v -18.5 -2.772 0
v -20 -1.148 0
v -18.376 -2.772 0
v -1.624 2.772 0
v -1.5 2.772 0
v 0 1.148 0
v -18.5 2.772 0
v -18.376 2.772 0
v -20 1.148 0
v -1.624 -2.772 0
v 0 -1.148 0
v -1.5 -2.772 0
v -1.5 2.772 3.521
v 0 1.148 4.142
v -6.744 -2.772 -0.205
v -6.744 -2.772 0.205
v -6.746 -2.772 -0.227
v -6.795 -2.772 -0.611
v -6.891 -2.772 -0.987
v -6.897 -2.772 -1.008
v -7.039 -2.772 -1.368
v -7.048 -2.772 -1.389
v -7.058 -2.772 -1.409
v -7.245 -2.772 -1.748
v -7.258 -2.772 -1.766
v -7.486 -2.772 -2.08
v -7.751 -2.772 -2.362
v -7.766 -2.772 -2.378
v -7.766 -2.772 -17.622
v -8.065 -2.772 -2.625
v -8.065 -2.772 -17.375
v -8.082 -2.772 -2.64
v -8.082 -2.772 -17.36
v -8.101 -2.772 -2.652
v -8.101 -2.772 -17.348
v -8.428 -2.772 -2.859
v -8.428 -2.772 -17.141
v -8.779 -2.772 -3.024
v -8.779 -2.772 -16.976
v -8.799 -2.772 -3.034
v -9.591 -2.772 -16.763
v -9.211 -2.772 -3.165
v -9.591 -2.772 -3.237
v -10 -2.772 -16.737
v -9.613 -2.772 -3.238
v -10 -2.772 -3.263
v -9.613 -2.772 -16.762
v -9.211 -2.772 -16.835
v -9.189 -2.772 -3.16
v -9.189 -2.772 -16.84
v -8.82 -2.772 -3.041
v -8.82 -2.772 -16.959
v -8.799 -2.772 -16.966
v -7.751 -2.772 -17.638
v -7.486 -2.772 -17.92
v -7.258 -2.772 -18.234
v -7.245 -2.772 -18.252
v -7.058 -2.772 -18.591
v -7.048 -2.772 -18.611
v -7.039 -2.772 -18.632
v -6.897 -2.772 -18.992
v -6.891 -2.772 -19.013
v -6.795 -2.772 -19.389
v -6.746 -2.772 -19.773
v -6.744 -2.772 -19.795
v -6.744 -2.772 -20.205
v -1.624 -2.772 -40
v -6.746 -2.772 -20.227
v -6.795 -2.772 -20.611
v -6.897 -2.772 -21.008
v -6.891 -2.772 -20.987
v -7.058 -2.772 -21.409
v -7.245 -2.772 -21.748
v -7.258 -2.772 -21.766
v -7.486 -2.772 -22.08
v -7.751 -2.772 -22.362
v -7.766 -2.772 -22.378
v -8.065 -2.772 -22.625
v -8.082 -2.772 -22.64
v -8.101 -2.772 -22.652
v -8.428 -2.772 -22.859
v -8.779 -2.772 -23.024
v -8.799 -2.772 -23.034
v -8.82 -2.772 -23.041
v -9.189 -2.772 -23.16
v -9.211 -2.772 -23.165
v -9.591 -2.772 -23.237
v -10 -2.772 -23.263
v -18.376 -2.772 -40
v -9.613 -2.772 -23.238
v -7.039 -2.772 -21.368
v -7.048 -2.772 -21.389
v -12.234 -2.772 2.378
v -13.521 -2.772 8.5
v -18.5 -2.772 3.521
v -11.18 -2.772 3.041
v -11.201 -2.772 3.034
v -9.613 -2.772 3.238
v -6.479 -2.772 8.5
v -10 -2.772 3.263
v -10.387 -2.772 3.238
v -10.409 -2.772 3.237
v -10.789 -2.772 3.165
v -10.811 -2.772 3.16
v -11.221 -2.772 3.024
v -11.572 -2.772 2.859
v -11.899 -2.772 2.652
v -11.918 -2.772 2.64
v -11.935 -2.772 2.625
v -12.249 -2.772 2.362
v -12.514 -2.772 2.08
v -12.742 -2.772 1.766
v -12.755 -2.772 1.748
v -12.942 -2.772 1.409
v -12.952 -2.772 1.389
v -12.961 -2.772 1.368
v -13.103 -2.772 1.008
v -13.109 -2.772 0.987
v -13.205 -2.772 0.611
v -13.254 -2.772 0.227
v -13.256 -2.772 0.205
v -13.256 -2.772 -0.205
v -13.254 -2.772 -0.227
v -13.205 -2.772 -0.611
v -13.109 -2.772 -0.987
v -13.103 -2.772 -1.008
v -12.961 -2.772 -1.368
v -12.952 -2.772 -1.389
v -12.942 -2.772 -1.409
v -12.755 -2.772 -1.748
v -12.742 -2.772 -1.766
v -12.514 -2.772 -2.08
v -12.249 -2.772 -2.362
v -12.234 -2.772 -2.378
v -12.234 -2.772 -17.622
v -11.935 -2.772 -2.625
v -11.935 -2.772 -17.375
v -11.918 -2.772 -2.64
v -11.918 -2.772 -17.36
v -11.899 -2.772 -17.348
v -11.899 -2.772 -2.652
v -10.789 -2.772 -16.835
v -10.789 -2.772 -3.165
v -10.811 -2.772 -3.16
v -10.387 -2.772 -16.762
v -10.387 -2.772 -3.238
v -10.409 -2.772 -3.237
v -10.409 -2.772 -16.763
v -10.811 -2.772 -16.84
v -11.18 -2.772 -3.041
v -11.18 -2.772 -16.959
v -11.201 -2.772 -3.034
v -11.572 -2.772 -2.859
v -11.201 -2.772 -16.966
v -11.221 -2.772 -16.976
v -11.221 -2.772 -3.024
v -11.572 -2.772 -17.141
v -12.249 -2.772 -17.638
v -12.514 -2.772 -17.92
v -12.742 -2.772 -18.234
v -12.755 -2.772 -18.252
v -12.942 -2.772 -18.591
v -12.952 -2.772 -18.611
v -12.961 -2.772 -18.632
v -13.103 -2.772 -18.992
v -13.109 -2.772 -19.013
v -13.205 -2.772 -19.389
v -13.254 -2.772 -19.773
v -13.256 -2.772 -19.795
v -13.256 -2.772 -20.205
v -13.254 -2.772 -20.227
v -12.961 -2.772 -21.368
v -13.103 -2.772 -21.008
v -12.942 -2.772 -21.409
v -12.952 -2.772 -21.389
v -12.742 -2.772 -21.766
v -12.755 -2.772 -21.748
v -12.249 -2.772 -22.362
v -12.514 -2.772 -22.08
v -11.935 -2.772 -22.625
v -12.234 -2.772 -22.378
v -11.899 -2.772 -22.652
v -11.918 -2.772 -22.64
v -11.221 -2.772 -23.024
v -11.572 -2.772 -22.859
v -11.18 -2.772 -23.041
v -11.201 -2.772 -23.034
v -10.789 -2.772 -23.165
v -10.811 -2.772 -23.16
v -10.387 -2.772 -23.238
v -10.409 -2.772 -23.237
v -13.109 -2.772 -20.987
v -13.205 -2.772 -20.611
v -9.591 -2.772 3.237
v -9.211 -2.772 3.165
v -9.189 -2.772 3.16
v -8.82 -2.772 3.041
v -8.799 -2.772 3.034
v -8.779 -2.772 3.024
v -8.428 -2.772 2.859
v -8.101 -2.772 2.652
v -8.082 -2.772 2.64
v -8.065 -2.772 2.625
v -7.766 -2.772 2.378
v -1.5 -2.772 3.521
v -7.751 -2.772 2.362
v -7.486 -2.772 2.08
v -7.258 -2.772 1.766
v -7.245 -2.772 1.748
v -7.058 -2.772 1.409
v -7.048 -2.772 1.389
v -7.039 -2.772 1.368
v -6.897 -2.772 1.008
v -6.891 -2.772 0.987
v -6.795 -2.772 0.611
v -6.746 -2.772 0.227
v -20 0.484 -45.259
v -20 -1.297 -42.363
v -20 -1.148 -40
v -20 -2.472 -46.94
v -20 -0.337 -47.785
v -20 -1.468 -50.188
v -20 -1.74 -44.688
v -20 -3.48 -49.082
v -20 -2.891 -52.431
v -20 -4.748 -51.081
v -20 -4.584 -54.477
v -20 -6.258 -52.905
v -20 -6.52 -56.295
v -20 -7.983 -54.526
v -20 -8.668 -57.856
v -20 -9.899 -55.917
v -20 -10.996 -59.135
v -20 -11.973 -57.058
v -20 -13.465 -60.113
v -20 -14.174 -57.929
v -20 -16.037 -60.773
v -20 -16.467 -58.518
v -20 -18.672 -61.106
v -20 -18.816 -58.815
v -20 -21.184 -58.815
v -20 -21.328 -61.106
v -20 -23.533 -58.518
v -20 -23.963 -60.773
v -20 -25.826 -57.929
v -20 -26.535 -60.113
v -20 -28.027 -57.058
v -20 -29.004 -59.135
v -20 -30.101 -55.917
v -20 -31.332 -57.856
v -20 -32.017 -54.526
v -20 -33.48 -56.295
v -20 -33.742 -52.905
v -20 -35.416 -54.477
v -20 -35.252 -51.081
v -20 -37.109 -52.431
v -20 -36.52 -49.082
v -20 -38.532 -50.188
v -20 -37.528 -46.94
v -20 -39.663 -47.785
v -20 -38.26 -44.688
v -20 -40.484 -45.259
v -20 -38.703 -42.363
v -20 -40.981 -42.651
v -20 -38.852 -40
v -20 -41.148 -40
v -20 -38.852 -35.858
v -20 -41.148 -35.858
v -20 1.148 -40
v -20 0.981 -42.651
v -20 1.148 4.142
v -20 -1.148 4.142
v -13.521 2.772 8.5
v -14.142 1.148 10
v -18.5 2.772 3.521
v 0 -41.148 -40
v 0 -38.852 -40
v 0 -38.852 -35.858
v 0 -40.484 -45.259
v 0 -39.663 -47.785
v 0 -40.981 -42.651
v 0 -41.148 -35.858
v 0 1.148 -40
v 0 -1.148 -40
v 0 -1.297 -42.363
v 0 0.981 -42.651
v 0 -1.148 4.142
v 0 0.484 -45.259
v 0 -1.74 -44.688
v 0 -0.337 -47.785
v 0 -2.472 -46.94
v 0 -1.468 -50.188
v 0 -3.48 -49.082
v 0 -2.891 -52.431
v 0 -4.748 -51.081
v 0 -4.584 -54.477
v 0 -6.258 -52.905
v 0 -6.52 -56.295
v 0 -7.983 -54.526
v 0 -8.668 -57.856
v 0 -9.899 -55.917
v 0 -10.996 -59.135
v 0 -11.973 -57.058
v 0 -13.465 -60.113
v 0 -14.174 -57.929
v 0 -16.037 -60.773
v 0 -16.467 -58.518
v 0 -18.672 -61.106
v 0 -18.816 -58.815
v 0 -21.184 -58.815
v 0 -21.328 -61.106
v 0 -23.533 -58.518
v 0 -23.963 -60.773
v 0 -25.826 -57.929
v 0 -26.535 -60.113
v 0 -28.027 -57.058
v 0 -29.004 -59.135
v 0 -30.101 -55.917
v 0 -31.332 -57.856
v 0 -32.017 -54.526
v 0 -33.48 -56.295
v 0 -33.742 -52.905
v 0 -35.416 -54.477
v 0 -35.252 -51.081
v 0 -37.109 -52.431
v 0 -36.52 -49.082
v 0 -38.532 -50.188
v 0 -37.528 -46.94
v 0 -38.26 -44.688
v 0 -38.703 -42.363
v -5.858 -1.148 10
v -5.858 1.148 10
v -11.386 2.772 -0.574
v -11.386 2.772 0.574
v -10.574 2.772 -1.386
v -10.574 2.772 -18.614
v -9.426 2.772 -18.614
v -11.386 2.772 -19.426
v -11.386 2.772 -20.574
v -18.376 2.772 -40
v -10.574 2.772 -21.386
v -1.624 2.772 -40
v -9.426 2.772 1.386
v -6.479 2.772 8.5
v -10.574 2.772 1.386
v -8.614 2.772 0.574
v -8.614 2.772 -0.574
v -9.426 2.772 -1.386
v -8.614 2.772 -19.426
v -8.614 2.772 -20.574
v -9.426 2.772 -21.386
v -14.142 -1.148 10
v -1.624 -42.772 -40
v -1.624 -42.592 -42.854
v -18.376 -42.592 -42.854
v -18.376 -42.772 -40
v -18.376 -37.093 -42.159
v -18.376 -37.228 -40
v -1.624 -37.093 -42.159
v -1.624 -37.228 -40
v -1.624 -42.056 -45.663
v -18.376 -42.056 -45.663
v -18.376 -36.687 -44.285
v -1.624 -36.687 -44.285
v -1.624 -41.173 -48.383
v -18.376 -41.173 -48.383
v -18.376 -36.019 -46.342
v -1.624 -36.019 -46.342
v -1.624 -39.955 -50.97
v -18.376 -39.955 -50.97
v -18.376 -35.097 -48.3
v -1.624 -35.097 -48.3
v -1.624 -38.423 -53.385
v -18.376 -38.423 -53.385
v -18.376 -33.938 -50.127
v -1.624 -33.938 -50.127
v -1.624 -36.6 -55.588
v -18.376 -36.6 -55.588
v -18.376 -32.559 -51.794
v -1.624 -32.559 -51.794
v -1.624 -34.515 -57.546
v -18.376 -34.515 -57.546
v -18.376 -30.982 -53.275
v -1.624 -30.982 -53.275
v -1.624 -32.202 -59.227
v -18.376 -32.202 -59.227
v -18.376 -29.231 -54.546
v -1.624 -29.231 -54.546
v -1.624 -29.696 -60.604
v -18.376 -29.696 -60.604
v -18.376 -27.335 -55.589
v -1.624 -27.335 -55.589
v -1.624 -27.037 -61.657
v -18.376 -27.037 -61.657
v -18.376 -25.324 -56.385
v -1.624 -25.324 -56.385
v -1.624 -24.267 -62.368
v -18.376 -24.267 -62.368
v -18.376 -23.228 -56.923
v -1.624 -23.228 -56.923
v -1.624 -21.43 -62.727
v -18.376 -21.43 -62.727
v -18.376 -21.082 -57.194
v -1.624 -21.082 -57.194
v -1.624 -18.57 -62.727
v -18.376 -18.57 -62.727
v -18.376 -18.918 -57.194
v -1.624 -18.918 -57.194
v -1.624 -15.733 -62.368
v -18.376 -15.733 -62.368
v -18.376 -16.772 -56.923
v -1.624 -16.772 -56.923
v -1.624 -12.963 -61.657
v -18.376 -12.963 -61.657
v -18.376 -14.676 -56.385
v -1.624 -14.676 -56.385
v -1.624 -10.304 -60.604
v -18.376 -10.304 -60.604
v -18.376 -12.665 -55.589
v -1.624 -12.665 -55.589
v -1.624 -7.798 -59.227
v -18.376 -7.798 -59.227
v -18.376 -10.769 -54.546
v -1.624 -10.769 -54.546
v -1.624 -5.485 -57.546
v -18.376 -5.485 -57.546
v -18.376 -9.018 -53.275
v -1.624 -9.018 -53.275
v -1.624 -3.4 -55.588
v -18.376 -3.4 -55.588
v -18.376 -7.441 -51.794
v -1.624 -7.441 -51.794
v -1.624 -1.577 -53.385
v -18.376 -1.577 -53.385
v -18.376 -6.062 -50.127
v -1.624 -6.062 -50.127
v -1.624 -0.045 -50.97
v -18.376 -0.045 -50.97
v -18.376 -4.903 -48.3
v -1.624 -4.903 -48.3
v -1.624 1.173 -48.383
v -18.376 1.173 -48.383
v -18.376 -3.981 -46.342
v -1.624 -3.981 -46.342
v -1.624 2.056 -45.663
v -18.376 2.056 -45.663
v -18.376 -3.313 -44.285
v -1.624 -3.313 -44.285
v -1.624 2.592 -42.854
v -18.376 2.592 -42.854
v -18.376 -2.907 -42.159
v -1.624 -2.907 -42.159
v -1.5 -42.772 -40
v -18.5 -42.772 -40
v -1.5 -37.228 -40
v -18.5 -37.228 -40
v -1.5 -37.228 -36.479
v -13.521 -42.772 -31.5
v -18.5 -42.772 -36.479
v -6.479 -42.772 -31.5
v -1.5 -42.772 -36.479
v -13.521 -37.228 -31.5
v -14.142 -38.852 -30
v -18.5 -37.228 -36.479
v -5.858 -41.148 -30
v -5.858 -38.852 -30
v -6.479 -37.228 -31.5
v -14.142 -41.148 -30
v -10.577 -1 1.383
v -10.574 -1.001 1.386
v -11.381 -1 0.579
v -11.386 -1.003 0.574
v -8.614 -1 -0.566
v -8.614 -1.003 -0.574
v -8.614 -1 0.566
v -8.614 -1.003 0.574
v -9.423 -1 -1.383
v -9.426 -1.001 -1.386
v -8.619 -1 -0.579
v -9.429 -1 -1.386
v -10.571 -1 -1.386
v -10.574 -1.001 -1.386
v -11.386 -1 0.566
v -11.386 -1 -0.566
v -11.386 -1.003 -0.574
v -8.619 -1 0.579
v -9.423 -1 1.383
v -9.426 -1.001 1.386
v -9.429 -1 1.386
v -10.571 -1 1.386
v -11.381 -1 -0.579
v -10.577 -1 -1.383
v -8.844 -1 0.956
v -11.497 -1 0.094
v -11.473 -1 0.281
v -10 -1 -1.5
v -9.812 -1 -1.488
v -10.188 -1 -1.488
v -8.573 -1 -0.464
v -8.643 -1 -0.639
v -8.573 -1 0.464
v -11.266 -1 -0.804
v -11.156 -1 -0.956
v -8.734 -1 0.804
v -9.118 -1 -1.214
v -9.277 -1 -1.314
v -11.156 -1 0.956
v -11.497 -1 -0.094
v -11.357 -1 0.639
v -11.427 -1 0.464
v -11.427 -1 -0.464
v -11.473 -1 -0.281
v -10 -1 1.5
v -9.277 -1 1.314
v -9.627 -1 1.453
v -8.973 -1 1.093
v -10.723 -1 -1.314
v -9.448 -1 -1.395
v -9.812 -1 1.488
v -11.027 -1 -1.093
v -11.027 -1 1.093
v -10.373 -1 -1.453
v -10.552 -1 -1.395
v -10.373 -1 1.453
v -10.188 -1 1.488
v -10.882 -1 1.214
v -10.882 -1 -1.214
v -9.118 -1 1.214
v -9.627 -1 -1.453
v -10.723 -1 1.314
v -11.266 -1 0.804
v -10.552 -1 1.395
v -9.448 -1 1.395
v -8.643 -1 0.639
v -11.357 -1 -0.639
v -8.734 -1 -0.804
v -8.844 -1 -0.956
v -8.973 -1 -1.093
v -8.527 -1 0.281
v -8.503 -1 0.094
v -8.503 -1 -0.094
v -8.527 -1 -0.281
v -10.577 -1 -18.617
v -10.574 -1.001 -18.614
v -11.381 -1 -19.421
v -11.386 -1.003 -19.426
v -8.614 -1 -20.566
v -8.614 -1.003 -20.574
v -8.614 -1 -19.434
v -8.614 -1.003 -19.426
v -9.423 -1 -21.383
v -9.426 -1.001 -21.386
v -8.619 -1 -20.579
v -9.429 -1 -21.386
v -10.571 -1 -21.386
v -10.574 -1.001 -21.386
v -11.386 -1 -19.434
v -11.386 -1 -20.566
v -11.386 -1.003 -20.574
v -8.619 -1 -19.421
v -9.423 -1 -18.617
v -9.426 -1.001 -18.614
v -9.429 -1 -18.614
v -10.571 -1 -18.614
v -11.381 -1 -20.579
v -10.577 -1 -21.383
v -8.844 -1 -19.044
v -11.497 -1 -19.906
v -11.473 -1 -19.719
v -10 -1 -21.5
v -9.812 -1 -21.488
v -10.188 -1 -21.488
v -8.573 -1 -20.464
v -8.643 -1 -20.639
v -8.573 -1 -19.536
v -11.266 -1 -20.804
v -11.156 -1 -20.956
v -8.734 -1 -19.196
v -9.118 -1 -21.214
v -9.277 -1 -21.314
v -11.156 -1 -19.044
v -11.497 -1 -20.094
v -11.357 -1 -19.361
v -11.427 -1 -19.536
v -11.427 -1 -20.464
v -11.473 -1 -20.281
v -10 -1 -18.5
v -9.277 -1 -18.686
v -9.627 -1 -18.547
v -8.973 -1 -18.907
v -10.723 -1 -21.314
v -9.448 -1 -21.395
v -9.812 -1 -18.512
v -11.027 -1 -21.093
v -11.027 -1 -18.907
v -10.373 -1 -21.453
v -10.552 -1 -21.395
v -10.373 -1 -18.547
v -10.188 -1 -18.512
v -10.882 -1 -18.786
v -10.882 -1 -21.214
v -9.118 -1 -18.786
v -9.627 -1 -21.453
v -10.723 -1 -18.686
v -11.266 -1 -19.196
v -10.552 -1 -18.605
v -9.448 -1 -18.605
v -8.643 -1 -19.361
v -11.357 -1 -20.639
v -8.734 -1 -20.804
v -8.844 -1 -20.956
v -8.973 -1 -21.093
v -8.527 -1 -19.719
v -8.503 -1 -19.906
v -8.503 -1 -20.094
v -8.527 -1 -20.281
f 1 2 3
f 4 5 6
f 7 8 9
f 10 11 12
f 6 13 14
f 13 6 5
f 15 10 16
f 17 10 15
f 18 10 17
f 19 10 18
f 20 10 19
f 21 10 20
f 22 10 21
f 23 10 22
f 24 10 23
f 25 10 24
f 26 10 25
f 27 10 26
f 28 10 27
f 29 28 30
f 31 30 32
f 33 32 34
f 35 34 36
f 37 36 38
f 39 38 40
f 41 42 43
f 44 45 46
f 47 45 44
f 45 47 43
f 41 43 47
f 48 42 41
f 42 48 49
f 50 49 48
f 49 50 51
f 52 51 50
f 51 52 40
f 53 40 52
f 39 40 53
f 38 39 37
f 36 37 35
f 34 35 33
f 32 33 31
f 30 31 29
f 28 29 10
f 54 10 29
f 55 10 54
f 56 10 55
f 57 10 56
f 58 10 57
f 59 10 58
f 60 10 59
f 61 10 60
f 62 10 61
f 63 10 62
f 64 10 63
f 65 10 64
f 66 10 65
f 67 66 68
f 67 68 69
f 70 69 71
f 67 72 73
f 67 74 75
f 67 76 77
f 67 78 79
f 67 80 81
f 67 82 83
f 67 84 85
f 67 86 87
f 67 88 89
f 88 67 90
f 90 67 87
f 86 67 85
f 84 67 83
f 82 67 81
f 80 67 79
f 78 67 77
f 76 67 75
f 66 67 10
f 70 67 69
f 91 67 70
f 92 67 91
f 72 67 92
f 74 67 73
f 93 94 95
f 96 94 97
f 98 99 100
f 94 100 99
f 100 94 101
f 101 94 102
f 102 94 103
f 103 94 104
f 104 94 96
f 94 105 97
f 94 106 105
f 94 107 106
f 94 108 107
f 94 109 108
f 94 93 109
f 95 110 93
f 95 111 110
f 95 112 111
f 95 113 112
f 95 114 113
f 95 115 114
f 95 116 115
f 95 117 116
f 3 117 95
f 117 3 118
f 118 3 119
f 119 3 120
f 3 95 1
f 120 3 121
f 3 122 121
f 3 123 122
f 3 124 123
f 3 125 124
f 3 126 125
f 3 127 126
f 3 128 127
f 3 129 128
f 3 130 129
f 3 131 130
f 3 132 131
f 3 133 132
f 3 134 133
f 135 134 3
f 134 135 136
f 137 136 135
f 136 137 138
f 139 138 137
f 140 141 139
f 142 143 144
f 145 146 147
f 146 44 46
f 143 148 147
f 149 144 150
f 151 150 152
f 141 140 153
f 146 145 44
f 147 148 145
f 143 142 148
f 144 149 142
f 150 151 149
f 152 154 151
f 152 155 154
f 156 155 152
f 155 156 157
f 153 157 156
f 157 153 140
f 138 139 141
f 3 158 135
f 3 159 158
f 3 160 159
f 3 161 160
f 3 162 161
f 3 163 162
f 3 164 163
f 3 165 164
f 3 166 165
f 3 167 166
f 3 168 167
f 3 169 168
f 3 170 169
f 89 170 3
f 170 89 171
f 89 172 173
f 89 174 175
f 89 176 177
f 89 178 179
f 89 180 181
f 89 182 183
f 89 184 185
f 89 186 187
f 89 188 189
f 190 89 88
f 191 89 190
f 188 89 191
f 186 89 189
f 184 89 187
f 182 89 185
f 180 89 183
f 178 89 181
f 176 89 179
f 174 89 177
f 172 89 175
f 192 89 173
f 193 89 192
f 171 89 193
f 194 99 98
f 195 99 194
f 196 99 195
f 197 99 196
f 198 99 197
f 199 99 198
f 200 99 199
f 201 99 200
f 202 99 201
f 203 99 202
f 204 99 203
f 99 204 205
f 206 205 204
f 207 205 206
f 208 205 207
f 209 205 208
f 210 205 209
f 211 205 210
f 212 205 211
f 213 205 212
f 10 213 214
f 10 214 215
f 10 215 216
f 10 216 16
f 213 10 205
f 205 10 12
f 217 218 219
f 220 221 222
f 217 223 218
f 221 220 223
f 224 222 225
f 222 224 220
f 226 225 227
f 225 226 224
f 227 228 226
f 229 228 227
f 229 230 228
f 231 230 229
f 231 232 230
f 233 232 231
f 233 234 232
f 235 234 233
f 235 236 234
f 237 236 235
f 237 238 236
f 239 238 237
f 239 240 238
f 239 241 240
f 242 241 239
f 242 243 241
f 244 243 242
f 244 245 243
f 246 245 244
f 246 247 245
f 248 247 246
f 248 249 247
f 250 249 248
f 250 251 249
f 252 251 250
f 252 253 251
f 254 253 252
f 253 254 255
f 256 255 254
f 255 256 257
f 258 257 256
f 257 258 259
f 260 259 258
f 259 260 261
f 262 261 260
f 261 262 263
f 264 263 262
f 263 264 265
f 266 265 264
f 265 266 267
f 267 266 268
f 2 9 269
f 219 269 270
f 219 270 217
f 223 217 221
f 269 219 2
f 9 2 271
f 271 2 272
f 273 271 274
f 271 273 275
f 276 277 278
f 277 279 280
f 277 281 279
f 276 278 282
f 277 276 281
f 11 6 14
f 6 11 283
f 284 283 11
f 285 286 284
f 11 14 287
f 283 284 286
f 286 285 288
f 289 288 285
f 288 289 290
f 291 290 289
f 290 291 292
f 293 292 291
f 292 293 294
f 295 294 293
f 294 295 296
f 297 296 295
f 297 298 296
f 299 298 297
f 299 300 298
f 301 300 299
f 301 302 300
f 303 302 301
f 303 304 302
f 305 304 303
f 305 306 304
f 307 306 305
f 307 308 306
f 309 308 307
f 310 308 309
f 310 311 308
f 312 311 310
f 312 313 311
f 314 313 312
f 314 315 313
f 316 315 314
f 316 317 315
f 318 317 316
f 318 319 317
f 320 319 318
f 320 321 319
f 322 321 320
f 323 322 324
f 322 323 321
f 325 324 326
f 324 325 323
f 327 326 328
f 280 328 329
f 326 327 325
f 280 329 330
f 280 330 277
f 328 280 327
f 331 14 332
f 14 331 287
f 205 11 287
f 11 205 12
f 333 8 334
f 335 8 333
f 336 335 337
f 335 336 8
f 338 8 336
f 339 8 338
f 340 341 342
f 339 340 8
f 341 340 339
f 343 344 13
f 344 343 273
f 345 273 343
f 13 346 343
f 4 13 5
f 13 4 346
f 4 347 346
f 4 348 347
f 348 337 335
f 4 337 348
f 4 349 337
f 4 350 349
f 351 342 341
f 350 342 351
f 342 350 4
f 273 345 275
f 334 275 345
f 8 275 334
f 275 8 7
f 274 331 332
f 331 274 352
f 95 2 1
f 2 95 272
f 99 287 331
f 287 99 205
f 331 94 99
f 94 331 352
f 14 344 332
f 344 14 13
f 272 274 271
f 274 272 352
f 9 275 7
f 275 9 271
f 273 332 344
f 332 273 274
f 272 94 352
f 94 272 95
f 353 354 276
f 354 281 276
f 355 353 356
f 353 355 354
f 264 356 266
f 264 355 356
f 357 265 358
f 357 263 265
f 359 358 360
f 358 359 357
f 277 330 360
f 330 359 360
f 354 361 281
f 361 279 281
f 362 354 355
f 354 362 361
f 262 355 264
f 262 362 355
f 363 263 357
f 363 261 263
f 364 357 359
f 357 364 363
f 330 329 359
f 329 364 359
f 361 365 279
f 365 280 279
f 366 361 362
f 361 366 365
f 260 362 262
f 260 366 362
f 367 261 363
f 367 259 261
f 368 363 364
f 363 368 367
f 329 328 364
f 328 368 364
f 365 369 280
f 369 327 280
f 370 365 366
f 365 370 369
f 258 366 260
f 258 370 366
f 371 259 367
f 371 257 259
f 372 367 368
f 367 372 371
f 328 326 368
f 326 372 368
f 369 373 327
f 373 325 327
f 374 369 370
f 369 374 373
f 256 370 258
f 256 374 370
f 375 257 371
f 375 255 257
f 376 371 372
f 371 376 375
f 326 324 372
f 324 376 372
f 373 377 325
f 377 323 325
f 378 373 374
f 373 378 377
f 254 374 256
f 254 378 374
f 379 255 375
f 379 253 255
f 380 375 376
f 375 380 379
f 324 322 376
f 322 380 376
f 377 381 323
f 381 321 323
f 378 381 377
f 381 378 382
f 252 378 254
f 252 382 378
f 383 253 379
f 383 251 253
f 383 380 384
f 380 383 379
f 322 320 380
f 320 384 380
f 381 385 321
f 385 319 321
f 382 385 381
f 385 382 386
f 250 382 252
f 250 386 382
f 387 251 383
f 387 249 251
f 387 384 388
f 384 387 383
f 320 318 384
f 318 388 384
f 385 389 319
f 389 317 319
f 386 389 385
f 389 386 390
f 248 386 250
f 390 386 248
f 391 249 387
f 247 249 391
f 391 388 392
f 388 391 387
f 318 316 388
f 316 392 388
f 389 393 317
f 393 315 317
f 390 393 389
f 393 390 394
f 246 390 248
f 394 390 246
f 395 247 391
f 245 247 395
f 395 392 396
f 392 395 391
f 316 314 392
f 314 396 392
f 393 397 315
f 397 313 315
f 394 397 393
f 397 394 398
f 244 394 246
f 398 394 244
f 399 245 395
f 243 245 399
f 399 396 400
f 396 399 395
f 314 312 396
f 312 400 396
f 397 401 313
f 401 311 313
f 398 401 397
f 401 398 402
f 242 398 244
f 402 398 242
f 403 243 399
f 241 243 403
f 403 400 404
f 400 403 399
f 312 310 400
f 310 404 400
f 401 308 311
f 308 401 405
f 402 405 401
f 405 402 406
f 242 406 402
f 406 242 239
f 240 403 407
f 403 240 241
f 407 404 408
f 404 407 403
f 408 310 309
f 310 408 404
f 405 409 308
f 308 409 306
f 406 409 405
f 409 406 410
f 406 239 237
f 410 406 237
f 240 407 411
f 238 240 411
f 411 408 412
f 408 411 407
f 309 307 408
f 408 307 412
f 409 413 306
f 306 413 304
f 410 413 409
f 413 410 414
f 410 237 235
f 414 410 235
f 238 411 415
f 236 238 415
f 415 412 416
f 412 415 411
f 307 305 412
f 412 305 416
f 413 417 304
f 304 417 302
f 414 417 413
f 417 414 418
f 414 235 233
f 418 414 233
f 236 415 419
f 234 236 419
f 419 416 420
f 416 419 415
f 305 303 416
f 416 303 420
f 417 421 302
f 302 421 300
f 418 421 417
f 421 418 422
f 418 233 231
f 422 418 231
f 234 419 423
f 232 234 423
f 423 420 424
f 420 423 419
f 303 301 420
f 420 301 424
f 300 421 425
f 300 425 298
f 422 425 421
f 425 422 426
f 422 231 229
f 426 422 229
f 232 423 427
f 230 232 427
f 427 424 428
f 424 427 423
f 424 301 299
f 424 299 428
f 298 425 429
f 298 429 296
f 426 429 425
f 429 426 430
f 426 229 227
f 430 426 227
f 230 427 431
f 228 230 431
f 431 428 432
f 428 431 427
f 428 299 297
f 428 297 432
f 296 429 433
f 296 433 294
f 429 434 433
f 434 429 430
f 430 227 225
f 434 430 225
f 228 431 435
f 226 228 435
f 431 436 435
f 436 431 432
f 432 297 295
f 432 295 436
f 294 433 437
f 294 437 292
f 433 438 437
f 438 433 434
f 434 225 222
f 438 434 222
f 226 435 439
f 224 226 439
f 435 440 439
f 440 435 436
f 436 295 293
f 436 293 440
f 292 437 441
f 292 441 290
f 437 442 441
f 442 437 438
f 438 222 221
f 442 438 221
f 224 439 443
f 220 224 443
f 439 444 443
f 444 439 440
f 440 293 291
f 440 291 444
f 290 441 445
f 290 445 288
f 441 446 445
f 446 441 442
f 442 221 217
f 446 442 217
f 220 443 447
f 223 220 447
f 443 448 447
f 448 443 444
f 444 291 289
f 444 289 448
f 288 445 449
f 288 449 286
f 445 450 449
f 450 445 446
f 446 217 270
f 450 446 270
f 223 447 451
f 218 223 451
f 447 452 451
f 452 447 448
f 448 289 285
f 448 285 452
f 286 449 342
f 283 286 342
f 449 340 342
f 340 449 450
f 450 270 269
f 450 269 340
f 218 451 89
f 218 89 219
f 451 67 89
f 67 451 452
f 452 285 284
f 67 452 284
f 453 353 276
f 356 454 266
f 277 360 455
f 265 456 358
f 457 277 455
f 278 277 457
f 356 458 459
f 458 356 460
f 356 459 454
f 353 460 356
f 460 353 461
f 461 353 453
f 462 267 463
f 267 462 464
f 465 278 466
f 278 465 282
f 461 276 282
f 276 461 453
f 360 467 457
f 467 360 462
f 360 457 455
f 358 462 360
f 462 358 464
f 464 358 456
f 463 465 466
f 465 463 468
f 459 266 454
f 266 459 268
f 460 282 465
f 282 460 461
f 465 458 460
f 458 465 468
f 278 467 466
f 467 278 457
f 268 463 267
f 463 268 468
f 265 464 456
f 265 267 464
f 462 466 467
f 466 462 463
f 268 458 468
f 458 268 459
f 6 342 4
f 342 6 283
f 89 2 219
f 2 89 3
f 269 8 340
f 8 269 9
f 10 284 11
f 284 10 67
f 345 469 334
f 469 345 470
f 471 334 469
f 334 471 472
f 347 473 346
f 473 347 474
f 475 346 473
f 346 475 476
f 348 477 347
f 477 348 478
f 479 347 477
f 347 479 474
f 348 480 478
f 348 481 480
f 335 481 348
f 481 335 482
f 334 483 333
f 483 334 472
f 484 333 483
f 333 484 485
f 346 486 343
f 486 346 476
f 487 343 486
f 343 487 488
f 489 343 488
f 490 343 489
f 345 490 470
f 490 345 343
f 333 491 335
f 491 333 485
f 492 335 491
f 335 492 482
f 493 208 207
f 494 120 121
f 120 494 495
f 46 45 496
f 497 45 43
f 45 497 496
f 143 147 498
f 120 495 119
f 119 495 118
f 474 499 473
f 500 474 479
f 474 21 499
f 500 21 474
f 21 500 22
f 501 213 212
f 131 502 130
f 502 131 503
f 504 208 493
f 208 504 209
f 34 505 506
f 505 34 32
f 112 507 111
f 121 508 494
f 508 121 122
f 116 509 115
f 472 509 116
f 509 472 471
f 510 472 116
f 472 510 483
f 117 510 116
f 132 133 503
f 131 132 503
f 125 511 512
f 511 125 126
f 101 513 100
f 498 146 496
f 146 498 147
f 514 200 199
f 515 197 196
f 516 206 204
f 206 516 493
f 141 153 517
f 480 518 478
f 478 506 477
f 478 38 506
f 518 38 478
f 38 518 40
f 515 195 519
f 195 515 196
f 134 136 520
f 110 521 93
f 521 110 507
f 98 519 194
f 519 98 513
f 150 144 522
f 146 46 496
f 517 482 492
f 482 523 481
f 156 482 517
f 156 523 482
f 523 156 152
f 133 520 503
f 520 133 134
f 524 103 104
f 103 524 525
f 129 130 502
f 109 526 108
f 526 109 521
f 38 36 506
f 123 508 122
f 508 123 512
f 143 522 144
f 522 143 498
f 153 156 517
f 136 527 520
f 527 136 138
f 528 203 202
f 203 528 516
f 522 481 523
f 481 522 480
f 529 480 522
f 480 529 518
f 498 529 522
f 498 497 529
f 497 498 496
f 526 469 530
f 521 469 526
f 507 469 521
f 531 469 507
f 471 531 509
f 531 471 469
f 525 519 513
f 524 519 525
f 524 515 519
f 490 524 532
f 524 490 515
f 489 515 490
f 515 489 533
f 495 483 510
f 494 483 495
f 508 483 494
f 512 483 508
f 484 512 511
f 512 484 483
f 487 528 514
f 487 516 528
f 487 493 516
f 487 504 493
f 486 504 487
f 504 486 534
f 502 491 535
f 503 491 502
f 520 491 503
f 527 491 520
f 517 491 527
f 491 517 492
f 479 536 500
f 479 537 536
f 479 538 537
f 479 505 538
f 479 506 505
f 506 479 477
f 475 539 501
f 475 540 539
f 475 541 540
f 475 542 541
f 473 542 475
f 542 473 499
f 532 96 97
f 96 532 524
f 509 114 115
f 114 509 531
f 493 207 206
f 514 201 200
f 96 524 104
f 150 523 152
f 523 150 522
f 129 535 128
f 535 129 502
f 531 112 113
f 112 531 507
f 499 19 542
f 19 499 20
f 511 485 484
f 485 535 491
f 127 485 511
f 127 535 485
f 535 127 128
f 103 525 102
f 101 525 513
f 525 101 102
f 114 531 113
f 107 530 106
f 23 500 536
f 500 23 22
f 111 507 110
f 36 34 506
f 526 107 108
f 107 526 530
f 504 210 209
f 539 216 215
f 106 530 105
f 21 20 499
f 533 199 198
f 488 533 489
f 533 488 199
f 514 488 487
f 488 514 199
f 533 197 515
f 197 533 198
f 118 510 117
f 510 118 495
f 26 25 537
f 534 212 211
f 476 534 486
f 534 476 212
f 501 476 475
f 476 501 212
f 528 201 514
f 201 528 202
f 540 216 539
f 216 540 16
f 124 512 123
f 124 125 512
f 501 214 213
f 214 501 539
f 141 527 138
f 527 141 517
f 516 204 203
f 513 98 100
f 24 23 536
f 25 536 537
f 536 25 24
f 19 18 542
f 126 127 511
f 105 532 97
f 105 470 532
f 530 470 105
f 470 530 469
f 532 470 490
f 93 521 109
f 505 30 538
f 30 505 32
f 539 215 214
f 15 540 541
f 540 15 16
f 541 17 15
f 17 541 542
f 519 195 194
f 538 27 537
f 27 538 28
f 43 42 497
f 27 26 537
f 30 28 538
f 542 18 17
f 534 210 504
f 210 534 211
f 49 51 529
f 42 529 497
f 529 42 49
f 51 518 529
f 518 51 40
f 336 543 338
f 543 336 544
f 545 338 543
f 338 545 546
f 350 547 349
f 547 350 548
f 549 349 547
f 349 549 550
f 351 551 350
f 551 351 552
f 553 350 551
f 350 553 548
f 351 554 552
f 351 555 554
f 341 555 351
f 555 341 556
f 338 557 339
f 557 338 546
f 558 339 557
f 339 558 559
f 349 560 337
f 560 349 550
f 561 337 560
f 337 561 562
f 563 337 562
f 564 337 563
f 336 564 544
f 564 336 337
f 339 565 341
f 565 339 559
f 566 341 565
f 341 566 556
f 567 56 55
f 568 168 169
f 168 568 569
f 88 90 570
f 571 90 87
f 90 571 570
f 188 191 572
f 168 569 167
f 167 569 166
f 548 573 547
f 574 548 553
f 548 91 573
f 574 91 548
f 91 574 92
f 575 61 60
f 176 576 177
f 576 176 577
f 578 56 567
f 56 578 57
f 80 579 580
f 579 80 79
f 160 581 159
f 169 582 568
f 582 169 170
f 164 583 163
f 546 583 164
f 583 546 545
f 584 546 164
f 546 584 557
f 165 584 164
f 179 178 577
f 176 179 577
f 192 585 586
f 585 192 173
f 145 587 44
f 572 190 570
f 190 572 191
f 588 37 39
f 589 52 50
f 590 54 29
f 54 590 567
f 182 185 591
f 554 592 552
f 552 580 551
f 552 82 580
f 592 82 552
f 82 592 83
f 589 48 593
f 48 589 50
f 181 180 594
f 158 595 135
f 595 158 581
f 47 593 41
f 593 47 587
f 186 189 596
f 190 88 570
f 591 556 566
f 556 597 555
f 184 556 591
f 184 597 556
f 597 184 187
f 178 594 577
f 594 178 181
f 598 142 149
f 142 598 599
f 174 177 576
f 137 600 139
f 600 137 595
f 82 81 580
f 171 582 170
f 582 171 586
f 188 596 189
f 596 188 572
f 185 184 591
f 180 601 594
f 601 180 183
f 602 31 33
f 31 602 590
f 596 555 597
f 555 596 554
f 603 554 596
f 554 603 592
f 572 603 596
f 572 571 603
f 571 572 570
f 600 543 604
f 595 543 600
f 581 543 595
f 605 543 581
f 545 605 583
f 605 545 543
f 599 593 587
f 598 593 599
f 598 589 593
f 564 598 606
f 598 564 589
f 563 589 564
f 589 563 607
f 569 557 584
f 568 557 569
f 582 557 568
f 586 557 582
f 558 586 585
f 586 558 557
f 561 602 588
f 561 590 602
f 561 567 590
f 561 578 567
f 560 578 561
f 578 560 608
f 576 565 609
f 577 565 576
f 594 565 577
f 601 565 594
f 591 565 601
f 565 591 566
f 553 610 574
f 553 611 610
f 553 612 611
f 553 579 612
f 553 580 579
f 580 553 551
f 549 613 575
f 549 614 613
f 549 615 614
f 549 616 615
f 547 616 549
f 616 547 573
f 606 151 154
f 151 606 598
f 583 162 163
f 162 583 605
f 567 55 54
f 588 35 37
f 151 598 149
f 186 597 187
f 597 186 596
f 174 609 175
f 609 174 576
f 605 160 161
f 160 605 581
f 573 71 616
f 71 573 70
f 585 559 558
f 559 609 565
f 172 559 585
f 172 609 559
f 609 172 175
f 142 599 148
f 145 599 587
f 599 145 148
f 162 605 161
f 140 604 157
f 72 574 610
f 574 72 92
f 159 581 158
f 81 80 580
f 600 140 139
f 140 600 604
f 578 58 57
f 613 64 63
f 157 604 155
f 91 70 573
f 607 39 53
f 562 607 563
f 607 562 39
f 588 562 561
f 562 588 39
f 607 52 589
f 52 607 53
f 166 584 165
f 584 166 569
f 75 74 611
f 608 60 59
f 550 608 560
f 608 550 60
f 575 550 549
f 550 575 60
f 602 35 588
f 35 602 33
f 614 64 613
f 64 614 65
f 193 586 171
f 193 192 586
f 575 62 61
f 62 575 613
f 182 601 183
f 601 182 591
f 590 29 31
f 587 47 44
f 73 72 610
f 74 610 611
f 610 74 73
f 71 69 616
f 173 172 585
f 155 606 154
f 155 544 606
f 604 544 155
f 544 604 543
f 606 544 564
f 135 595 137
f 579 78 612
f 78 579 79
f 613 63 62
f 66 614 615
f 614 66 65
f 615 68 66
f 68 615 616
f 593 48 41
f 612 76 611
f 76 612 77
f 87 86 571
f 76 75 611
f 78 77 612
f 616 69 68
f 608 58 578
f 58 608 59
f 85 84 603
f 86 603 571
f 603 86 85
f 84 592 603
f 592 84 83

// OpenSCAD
// ************* Credits part *************

// Programmed by Fryns - March 2014

// Optimized for Customizer 

// Includes Pie Slice OpenSCAD Library by Chris Petersen, published on Thingiverse 27-Jun-2013 (thing:109467)	 

// ************* Declaration part *************

/* [Hanger] */
// Width of hanger in mm
width=20;
// Thickness of hanger in mm
thickness=6;
// Length of straigth part in mm
length=40;
// Diameter of circle producing hanger arc in mm
turn_diameter=40;
// Angle of arc
turn_angle=180; //[1:360]

/* [Geometry and finish] */
resolution=50; //[20:Draft,50:Medium,100:Fine, 200:very fine]
// Choose even numbers: 8 for 3D print optimized and higher e.g. 100 for fine
geometry=8; // Note that module "end" is only accurate for geometry = 4*integer

/* [Holes] */
// Hole size in mm
hole_diameter=3;
// Hole 1 position in mm
hole1=0;
// Hole 1 position in mm
hole2=20;
// Depth of countersink in mm
countersink_depth=2;

/* [Hidden] */
geo_width=width-thickness*cos(360/(geometry*2));

// ************* Executable part *************
rotate(a=[0,90,180])
difference(){
	assembly();
	translate([hole1,0,0])
		hole();
	translate([hole2,0,0])
		hole();
}

// ************* Module part *************

module assembly(){
	translate([0,0,0])
		rotate(a=[0,0,0])
			end();
	translate([0,0,0])
		rotate(a=[0,0,0])
			straight(length=length);
	translate([length,0,0])
		rotate(a=[0,0,0])
			turn(diameter=turn_diameter,angle=turn_angle);
	translate([length+turn_diameter/2*cos(turn_angle-90),turn_diameter/2+turn_diameter/2*sin(turn_angle-90),0])
		rotate(a=[0,0,turn_angle-180])	
			end();
}

module hole(){
	translate([0,0,width/2])
		rotate(a=[-90,0,0]){
			rotate(a=[0,0,90-(180-(360/geometry))/2])
				cylinder(h = thickness+0.01, r = hole_diameter/2, $fn=geometry, center = true);
			translate([0,0,thickness/2-countersink_depth])
				cylinder(h = countersink_depth+0.01, r1 = hole_diameter/2, r2 = (hole_diameter+2*countersink_depth)/2, $fn=resolution, center = false);
		}
}

module turn(diameter,angle){
	translate([0,diameter/2,0])
		rotate(a=[0,0,-90])
			intersection(){
				ring(diameter=diameter);
				translate([0,0,-(geo_width+thickness)])
					pie(radius=diameter/2+thickness, angle=angle, height=2*(geo_width+thickness), spin=0);
			}
}

module straight(length){
	translate([0,0,thickness*cos(360/(geometry*2))/2])
		rotate(a=[-180,-90,0])
			linear_extrude(height = length, center = false, convexity = 10, twist = 0)
				hull() {
   				translate([geo_width,0,0])
				rotate(a=90-(180-(360/geometry))/2)
    				circle(thickness/2,$fn=geometry);
				rotate(a=90-(180-(360/geometry))/2)
   				circle(thickness/2,$fn=geometry);
 				}
}

module ring(diameter){
	translate([0,0,thickness*cos(360/(geometry*2))/2])
		rotate_extrude(convexity = 10, $fn = resolution)
			translate([diameter/2, 0, 0])
				rotate(a=[0,0,90])
					hull() {
   					translate([geo_width,0,0])
						rotate(a=90-(180-(360/geometry))/2)
    						circle(thickness/2,$fn=geometry);
						rotate(a=90-(180-(360/geometry))/2)
   						circle(thickness/2,$fn=geometry);
 				}
}

module end() {
	translate([0,0,geo_width/2+thickness*cos(360/(geometry*2))/2])
		intersection(){
			translate([-2*(geo_width+thickness),-(geo_width+thickness),-(geo_width+thickness)])
				cube(2*(geo_width+thickness));
			rotate(a=[90,-90,0])
				rotate(a=90-(180-(360/geometry))/2)
					rotate_extrude(convexity = 10, $fn = geometry)
						hull() {
	   					translate([(geo_width/2+thickness*cos(360/(geometry*2))/2)/cos(360/(geometry*2))-thickness*cos(360/(geometry*2))/2,0,0])
							rotate(a=90-(180-(360/geometry))/2)
    							circle(thickness/2,$fn=geometry);
							translate([thickness*cos(360/(geometry*2))/2,0,0])
   							square(thickness*cos(360/(geometry*2)),center=true);
 						}
		}
}

// ****************************************************************************
// Borrowed code
// ****************************************************************************

/**
 * pie.scad
 *
 * Use this module to generate a pie- or pizza- slice shape, which is particularly useful
 * in combination with `difference()` and `intersection()` to render shapes that extend a
 * certain number of degrees around or within a circle.
 *
 * This openSCAD library is part of the [dotscad](https://github.com/dotscad/dotscad)
 * project.
 *
 * @copyright  Chris Petersen, 2013
 * @license    http://creativecommons.org/licenses/LGPL/2.1/
 * @license    http://creativecommons.org/licenses/by-sa/3.0/
 *
 * @see        http://www.thingiverse.com/thing:109467
 * @source     https://github.com/dotscad/dotscad/blob/master/pie.scad
 *
 * @param float radius Radius of the pie
 * @param float angle  Angle (size) of the pie to slice
 * @param float height Height (thickness) of the pie
 * @param float spin   Angle to spin the slice on the Z axis
 */
module pie(radius, angle, height, spin=0) {

    // Negative angles shift direction of rotation
    clockwise = (angle < 0) ? true : false;
    // Support angles < 0 and > 360
    normalized_angle = abs((angle % 360 != 0) ? angle % 360 : angle % 360 + 360);
    // Select rotation direction
    rotation = clockwise ? [0, 180 - normalized_angle] : [180, normalized_angle];
    // Render
    if (angle != 0) {
        rotate([0,0,spin]) linear_extrude(height=height)
            difference() {
                circle(radius);
                if (normalized_angle < 180) {
                    union() for(a = rotation)
                        rotate(a) translate([-radius, 0, 0]) square(radius * 2);
                }
                else if (normalized_angle != 360) {
                    intersection_for(a = rotation)
                        rotate(a) translate([-radius, 0, 0]) square(radius * 2);
                }
            }
    }

}
